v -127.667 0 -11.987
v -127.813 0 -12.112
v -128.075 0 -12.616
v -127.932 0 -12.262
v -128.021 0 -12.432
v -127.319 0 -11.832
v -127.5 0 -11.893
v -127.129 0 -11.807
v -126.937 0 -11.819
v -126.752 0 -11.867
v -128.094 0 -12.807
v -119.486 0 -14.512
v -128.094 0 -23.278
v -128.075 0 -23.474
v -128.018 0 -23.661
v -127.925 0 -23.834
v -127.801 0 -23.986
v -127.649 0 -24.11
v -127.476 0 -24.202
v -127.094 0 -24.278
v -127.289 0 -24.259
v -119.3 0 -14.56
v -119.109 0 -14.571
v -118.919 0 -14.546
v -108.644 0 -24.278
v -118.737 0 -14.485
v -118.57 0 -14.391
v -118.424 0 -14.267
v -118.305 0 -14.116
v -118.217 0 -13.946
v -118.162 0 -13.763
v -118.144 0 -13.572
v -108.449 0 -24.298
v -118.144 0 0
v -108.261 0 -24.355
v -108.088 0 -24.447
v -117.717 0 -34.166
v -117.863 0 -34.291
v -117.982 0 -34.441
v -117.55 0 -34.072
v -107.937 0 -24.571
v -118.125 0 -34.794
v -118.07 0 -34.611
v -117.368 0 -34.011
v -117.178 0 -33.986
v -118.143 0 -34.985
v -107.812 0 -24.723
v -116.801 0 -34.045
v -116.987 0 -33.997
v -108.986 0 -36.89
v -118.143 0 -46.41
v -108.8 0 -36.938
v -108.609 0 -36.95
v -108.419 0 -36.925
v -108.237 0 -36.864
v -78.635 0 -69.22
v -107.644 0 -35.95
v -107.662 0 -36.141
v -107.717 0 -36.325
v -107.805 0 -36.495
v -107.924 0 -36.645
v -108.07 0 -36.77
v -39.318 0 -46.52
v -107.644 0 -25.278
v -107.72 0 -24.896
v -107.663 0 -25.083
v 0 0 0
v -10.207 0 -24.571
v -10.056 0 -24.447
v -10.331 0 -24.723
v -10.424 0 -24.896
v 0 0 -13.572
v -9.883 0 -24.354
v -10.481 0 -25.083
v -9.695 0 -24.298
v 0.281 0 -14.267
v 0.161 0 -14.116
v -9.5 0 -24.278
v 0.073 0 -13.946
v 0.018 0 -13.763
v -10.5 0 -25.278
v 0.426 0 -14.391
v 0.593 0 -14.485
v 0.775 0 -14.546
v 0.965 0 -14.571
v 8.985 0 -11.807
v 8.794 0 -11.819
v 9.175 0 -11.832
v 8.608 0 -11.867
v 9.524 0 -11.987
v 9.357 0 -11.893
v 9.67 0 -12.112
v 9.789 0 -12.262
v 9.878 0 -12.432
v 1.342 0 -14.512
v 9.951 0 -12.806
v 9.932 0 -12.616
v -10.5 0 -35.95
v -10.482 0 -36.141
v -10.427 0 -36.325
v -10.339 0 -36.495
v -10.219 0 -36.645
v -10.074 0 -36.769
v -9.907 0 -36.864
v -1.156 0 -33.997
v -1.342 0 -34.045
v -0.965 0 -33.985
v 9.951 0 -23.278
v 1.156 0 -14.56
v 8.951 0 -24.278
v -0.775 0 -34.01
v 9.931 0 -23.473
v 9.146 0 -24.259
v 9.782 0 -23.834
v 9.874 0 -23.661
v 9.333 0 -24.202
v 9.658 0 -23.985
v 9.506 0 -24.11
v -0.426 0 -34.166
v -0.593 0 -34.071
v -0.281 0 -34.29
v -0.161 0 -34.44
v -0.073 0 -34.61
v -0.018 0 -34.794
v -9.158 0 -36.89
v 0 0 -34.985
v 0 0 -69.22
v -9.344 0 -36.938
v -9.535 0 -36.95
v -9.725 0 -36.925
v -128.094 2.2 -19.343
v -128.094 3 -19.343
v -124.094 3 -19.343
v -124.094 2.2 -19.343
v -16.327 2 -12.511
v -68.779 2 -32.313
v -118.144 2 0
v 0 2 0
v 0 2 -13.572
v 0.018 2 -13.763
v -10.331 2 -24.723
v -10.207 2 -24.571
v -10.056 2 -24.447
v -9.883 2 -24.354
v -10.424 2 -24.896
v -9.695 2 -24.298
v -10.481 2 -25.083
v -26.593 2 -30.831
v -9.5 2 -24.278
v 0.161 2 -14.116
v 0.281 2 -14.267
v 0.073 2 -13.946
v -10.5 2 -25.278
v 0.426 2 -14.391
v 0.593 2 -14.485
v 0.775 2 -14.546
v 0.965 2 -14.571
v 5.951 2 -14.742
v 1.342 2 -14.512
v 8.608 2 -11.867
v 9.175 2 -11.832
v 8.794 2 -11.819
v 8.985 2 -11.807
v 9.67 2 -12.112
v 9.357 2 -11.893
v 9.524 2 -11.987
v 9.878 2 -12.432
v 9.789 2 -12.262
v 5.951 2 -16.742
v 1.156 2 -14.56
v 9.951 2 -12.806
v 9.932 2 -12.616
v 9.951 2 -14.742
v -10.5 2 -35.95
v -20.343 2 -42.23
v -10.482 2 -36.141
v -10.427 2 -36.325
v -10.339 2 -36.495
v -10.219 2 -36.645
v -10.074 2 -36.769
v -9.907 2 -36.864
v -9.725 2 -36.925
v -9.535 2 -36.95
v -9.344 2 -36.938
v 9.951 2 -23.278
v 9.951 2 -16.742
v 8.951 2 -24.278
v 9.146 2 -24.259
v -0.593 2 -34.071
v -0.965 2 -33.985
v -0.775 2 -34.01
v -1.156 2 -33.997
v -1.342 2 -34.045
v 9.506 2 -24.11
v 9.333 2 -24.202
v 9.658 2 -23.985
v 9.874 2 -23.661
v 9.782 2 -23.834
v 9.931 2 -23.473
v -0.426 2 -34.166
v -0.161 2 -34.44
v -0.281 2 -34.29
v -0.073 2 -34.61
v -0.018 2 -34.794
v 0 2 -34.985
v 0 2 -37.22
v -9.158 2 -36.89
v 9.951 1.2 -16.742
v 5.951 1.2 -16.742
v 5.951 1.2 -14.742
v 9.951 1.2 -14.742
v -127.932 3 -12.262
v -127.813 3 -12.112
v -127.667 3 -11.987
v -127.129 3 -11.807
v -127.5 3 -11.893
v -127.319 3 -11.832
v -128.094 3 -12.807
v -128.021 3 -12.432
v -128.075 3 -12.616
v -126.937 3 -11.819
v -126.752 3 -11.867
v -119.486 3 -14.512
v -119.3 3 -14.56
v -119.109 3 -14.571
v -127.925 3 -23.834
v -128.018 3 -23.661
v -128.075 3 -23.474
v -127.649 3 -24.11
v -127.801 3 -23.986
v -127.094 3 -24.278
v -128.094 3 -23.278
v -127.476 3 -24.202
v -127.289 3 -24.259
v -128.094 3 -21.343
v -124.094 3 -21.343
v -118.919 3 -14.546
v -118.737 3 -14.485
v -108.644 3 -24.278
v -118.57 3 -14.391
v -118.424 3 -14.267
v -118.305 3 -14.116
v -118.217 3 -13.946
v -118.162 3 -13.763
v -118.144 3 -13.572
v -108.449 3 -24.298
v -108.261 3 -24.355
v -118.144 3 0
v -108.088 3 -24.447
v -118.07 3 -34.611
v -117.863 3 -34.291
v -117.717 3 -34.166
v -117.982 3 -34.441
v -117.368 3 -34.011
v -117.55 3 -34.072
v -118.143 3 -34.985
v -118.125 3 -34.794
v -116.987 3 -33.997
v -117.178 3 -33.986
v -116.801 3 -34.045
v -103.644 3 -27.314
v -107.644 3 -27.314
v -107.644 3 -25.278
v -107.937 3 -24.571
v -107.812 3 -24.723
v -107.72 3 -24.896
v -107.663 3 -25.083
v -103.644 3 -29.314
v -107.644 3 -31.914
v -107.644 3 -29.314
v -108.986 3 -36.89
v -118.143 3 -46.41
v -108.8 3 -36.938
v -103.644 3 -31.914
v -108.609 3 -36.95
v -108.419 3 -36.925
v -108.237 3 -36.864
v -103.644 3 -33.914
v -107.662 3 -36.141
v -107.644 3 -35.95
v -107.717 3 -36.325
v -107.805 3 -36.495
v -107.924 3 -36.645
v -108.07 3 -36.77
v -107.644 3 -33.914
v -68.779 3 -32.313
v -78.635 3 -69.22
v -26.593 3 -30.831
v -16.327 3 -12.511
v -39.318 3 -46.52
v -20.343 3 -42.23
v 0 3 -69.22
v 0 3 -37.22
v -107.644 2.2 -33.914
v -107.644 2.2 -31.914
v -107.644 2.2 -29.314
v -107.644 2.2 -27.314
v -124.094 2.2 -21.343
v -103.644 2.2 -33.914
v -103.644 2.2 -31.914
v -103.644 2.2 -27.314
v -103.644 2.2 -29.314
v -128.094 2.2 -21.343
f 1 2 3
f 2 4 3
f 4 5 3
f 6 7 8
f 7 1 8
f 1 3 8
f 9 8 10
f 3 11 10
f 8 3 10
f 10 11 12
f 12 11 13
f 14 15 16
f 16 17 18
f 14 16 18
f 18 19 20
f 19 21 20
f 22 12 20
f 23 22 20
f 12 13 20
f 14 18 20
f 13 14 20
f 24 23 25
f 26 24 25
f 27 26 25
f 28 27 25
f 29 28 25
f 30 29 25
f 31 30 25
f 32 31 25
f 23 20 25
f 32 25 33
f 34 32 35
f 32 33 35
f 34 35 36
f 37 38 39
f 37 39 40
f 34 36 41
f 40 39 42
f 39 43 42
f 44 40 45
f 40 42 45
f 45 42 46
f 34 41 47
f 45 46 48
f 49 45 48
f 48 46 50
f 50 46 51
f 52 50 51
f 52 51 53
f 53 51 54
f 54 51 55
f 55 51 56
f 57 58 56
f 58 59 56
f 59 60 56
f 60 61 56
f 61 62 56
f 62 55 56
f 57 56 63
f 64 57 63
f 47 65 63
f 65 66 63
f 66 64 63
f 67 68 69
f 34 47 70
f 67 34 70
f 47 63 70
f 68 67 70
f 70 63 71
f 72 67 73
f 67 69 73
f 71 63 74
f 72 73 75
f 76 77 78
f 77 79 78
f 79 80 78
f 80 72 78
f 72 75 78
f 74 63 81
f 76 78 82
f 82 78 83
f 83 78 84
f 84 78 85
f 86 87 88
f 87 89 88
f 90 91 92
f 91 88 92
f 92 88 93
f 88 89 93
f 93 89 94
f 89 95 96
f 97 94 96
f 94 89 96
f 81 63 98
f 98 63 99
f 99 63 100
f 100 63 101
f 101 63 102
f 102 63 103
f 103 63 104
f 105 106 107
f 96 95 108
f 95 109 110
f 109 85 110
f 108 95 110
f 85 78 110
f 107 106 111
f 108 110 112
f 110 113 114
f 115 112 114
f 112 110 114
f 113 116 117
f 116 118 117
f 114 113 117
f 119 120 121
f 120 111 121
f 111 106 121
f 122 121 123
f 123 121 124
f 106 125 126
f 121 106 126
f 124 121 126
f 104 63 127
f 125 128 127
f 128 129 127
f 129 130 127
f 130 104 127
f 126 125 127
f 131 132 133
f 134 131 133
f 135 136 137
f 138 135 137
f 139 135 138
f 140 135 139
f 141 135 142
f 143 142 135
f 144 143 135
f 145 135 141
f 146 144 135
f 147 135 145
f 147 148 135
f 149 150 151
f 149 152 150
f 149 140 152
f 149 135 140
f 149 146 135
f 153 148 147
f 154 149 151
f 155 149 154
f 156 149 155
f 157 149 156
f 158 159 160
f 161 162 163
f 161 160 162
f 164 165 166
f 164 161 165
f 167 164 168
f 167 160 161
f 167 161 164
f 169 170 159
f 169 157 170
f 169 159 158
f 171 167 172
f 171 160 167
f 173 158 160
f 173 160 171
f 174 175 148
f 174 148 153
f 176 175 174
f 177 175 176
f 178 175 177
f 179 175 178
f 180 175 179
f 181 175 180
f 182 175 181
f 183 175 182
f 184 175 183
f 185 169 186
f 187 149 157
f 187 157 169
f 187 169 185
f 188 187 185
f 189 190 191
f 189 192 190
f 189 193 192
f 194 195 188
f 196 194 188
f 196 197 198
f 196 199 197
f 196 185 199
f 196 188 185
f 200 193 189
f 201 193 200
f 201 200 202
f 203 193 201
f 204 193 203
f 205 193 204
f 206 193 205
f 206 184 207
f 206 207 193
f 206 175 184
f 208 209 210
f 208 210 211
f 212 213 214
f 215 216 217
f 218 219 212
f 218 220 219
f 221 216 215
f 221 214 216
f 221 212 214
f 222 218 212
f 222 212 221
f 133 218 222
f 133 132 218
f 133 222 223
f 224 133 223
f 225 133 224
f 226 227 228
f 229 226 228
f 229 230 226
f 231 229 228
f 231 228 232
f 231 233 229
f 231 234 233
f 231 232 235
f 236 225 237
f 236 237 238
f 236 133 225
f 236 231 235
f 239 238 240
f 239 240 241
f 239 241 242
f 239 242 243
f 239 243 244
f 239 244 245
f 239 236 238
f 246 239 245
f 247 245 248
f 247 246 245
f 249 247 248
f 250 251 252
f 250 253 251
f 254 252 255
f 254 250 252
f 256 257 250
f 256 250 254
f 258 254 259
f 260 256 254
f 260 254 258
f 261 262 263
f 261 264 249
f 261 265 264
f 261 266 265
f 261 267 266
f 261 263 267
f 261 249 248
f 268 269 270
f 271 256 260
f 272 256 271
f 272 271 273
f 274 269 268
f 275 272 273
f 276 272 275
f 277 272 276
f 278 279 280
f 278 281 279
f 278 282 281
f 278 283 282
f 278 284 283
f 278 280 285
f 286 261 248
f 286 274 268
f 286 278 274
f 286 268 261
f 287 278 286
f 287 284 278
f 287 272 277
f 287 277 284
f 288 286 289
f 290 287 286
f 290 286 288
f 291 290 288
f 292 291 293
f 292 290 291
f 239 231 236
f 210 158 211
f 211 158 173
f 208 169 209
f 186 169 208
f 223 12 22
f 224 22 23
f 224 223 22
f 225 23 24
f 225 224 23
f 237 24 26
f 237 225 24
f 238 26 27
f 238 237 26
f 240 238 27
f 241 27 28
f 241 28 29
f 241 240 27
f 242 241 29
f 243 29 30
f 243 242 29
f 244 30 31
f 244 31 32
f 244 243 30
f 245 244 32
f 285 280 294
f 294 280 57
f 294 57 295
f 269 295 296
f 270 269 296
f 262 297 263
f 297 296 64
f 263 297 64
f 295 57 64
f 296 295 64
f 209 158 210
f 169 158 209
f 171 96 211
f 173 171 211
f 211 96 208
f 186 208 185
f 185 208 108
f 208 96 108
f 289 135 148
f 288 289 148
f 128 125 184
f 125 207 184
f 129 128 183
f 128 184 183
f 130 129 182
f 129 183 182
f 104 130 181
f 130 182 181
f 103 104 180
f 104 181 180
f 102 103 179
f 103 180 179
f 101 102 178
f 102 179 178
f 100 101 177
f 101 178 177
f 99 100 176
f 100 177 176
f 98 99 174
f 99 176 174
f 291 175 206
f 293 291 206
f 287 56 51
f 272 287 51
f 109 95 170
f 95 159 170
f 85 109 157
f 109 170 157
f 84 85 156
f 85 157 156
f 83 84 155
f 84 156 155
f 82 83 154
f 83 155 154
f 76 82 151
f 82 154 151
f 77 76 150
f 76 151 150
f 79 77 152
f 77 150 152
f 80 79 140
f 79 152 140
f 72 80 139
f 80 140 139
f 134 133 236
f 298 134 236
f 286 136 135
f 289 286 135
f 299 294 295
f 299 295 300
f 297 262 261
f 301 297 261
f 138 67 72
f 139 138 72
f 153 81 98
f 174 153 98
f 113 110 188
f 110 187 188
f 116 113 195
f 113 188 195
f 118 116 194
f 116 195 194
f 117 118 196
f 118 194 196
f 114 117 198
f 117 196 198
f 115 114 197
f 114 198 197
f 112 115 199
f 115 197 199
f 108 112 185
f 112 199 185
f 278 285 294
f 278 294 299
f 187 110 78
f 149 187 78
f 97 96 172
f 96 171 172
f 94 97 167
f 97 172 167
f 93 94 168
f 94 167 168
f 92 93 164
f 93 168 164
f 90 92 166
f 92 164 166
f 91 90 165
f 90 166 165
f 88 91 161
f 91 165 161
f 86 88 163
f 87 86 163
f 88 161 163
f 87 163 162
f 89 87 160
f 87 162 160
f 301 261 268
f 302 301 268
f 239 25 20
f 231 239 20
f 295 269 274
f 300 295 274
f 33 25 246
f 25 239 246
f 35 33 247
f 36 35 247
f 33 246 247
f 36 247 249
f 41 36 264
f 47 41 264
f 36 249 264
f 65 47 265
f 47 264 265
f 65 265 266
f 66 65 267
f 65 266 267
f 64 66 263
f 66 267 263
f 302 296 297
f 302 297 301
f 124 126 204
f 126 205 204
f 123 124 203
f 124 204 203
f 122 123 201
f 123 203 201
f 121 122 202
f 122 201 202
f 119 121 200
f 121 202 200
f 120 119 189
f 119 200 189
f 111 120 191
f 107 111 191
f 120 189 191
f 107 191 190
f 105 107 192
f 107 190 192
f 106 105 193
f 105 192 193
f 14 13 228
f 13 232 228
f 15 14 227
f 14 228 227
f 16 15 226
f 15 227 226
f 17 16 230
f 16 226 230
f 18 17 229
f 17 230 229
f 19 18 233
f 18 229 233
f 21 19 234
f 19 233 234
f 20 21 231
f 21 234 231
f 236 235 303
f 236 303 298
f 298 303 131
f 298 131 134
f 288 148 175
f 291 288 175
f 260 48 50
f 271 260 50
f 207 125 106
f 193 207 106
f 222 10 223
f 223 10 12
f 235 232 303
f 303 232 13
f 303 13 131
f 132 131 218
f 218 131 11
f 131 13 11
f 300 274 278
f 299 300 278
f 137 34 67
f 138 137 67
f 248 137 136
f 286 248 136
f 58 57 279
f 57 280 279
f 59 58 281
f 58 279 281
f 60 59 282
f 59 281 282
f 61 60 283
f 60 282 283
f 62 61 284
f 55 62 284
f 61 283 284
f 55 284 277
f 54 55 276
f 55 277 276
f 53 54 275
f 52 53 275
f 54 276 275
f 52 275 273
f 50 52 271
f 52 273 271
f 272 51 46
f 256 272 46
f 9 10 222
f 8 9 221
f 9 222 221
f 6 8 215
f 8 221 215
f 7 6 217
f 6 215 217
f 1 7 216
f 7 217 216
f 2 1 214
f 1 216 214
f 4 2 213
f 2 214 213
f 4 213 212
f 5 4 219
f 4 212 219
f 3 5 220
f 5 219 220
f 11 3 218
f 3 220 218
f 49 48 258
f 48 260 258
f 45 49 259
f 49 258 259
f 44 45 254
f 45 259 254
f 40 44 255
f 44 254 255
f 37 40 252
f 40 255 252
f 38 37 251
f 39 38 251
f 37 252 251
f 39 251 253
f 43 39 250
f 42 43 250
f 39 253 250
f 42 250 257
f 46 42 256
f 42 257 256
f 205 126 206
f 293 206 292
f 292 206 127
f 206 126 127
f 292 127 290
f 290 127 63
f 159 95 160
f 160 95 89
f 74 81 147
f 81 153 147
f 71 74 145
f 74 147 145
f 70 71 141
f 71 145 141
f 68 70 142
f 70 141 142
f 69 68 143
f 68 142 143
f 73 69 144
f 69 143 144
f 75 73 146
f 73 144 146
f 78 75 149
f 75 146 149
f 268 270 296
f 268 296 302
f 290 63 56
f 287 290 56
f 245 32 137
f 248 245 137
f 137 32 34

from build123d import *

# Parameters (mm, degrees)
P_IDAT_VYSUNUT_M1_DEPTH  = 3
P_IDAT_VYSUNUT_M2_DEPTH  = 2
ZAOBLIT4_R               = 1
SKICA2_W                 = 4
SKICA2_H                 = 2
ODEBRAT_VYSUNUT_M2_DEPTH = 0.8
SKICA3_W                 = 4
SKICA3_H                 = 2
ODEBRAT_VYSUNUT_M3_DEPTH = 0.8


with BuildPart() as part:
    # Skica1 → P_idat vysunut_m1 (new body)
    with BuildSketch(Plane(origin=(0, 0, 0), x_dir=(1, 0, 0), z_dir=(0, 1, 0))):
        Polygon((-118.143750166, 15), (-118.143750166, 0), (-68.779346971, 32.313398106), (-16.32734533, 12.51119421), (-26.593132493, 30.830954414), (-20.343228113, 42.230019956), (0, 37.22), (0, 69.22), (-39.317553332, 46.52), (-78.635106664, 69.22), (-118.143185584, 46.41), (-118.143185584, 33.5570142), (-107.643750166, 37.378496169), (-107.643750166, 24.278496169), (-128.093750166, 24.278496169), (-128.093750166, 11.378496169), align=None)
    extrude(amount=P_IDAT_VYSUNUT_M1_DEPTH)

    # Skica1_5 → P_idat vysunut_m2 (add)
    with BuildSketch(Plane(origin=(0, 0, 0), x_dir=(1, 0, 0), z_dir=(0, 1, 0))):
        Polygon((-68.779346971, 32.313398106), (-118.143750166, 0), (0, 0), (0, 15), (9.950504516, 11.37831254), (9.950504516, 24.27831254), (-10.5, 24.27831254), (-10.5, 37.37831254), (0, 33.55662508), (0, 37.22), (-20.343228113, 42.230019956), (-26.593132493, 30.830954414), (-16.32734533, 12.51119421), align=None)
    extrude(amount=P_IDAT_VYSUNUT_M2_DEPTH)

    # Zaoblit4
    zaoblit4_edges = [part.edges().sort_by_distance(p)[0] for p in [
        (-118.143750166, 1.5, -15),
        (-128.093750166, 1.5, -11.378496169),
        (-128.093750166, 1.5, -24.278496169),
        (-107.643750166, 1.5, -24.278496169),
        (-107.643750166, 1.5, -37.378496169),
        (-118.143185584, 1.5, -33.5570142),
        (-10.5, 1, -24.27831254),
        (-10.5, 1, -37.37831254),
        (0, 1, -33.55662508),
        (0, 1, -15),
        (9.950504516, 1, -11.37831254),
        (9.950504516, 1, -24.27831254),
    ]]
    fillet(zaoblit4_edges, radius=ZAOBLIT4_R)

    # Skica2 → Odebrat vysunut_m2 (cut)
    with BuildSketch(Plane(origin=(0, 3, 0), x_dir=(1, 0, 0), z_dir=(0, 1, 0))):
        with Locations((-105.643750166, 32.914422166)):
            Rectangle(SKICA2_W, SKICA2_H)
        with Locations((-126.093750166, 20.342570172)):
            Rectangle(SKICA2_W, SKICA2_H)
        with Locations((-105.643750166, 28.314422166)):
            Rectangle(SKICA2_W, SKICA2_H)
    extrude(amount=-ODEBRAT_VYSUNUT_M2_DEPTH, mode=Mode.SUBTRACT)

    # Skica3 → Odebrat vysunut_m3 (cut)
    with BuildSketch(Plane(origin=(0, 2, 0), x_dir=(1, 0, 0), z_dir=(0, 1, 0))):
        with Locations((7.950504516, 15.742386544)):
            Rectangle(SKICA3_W, SKICA3_H)
    extrude(amount=-ODEBRAT_VYSUNUT_M3_DEPTH, mode=Mode.SUBTRACT)


solid = part.part
